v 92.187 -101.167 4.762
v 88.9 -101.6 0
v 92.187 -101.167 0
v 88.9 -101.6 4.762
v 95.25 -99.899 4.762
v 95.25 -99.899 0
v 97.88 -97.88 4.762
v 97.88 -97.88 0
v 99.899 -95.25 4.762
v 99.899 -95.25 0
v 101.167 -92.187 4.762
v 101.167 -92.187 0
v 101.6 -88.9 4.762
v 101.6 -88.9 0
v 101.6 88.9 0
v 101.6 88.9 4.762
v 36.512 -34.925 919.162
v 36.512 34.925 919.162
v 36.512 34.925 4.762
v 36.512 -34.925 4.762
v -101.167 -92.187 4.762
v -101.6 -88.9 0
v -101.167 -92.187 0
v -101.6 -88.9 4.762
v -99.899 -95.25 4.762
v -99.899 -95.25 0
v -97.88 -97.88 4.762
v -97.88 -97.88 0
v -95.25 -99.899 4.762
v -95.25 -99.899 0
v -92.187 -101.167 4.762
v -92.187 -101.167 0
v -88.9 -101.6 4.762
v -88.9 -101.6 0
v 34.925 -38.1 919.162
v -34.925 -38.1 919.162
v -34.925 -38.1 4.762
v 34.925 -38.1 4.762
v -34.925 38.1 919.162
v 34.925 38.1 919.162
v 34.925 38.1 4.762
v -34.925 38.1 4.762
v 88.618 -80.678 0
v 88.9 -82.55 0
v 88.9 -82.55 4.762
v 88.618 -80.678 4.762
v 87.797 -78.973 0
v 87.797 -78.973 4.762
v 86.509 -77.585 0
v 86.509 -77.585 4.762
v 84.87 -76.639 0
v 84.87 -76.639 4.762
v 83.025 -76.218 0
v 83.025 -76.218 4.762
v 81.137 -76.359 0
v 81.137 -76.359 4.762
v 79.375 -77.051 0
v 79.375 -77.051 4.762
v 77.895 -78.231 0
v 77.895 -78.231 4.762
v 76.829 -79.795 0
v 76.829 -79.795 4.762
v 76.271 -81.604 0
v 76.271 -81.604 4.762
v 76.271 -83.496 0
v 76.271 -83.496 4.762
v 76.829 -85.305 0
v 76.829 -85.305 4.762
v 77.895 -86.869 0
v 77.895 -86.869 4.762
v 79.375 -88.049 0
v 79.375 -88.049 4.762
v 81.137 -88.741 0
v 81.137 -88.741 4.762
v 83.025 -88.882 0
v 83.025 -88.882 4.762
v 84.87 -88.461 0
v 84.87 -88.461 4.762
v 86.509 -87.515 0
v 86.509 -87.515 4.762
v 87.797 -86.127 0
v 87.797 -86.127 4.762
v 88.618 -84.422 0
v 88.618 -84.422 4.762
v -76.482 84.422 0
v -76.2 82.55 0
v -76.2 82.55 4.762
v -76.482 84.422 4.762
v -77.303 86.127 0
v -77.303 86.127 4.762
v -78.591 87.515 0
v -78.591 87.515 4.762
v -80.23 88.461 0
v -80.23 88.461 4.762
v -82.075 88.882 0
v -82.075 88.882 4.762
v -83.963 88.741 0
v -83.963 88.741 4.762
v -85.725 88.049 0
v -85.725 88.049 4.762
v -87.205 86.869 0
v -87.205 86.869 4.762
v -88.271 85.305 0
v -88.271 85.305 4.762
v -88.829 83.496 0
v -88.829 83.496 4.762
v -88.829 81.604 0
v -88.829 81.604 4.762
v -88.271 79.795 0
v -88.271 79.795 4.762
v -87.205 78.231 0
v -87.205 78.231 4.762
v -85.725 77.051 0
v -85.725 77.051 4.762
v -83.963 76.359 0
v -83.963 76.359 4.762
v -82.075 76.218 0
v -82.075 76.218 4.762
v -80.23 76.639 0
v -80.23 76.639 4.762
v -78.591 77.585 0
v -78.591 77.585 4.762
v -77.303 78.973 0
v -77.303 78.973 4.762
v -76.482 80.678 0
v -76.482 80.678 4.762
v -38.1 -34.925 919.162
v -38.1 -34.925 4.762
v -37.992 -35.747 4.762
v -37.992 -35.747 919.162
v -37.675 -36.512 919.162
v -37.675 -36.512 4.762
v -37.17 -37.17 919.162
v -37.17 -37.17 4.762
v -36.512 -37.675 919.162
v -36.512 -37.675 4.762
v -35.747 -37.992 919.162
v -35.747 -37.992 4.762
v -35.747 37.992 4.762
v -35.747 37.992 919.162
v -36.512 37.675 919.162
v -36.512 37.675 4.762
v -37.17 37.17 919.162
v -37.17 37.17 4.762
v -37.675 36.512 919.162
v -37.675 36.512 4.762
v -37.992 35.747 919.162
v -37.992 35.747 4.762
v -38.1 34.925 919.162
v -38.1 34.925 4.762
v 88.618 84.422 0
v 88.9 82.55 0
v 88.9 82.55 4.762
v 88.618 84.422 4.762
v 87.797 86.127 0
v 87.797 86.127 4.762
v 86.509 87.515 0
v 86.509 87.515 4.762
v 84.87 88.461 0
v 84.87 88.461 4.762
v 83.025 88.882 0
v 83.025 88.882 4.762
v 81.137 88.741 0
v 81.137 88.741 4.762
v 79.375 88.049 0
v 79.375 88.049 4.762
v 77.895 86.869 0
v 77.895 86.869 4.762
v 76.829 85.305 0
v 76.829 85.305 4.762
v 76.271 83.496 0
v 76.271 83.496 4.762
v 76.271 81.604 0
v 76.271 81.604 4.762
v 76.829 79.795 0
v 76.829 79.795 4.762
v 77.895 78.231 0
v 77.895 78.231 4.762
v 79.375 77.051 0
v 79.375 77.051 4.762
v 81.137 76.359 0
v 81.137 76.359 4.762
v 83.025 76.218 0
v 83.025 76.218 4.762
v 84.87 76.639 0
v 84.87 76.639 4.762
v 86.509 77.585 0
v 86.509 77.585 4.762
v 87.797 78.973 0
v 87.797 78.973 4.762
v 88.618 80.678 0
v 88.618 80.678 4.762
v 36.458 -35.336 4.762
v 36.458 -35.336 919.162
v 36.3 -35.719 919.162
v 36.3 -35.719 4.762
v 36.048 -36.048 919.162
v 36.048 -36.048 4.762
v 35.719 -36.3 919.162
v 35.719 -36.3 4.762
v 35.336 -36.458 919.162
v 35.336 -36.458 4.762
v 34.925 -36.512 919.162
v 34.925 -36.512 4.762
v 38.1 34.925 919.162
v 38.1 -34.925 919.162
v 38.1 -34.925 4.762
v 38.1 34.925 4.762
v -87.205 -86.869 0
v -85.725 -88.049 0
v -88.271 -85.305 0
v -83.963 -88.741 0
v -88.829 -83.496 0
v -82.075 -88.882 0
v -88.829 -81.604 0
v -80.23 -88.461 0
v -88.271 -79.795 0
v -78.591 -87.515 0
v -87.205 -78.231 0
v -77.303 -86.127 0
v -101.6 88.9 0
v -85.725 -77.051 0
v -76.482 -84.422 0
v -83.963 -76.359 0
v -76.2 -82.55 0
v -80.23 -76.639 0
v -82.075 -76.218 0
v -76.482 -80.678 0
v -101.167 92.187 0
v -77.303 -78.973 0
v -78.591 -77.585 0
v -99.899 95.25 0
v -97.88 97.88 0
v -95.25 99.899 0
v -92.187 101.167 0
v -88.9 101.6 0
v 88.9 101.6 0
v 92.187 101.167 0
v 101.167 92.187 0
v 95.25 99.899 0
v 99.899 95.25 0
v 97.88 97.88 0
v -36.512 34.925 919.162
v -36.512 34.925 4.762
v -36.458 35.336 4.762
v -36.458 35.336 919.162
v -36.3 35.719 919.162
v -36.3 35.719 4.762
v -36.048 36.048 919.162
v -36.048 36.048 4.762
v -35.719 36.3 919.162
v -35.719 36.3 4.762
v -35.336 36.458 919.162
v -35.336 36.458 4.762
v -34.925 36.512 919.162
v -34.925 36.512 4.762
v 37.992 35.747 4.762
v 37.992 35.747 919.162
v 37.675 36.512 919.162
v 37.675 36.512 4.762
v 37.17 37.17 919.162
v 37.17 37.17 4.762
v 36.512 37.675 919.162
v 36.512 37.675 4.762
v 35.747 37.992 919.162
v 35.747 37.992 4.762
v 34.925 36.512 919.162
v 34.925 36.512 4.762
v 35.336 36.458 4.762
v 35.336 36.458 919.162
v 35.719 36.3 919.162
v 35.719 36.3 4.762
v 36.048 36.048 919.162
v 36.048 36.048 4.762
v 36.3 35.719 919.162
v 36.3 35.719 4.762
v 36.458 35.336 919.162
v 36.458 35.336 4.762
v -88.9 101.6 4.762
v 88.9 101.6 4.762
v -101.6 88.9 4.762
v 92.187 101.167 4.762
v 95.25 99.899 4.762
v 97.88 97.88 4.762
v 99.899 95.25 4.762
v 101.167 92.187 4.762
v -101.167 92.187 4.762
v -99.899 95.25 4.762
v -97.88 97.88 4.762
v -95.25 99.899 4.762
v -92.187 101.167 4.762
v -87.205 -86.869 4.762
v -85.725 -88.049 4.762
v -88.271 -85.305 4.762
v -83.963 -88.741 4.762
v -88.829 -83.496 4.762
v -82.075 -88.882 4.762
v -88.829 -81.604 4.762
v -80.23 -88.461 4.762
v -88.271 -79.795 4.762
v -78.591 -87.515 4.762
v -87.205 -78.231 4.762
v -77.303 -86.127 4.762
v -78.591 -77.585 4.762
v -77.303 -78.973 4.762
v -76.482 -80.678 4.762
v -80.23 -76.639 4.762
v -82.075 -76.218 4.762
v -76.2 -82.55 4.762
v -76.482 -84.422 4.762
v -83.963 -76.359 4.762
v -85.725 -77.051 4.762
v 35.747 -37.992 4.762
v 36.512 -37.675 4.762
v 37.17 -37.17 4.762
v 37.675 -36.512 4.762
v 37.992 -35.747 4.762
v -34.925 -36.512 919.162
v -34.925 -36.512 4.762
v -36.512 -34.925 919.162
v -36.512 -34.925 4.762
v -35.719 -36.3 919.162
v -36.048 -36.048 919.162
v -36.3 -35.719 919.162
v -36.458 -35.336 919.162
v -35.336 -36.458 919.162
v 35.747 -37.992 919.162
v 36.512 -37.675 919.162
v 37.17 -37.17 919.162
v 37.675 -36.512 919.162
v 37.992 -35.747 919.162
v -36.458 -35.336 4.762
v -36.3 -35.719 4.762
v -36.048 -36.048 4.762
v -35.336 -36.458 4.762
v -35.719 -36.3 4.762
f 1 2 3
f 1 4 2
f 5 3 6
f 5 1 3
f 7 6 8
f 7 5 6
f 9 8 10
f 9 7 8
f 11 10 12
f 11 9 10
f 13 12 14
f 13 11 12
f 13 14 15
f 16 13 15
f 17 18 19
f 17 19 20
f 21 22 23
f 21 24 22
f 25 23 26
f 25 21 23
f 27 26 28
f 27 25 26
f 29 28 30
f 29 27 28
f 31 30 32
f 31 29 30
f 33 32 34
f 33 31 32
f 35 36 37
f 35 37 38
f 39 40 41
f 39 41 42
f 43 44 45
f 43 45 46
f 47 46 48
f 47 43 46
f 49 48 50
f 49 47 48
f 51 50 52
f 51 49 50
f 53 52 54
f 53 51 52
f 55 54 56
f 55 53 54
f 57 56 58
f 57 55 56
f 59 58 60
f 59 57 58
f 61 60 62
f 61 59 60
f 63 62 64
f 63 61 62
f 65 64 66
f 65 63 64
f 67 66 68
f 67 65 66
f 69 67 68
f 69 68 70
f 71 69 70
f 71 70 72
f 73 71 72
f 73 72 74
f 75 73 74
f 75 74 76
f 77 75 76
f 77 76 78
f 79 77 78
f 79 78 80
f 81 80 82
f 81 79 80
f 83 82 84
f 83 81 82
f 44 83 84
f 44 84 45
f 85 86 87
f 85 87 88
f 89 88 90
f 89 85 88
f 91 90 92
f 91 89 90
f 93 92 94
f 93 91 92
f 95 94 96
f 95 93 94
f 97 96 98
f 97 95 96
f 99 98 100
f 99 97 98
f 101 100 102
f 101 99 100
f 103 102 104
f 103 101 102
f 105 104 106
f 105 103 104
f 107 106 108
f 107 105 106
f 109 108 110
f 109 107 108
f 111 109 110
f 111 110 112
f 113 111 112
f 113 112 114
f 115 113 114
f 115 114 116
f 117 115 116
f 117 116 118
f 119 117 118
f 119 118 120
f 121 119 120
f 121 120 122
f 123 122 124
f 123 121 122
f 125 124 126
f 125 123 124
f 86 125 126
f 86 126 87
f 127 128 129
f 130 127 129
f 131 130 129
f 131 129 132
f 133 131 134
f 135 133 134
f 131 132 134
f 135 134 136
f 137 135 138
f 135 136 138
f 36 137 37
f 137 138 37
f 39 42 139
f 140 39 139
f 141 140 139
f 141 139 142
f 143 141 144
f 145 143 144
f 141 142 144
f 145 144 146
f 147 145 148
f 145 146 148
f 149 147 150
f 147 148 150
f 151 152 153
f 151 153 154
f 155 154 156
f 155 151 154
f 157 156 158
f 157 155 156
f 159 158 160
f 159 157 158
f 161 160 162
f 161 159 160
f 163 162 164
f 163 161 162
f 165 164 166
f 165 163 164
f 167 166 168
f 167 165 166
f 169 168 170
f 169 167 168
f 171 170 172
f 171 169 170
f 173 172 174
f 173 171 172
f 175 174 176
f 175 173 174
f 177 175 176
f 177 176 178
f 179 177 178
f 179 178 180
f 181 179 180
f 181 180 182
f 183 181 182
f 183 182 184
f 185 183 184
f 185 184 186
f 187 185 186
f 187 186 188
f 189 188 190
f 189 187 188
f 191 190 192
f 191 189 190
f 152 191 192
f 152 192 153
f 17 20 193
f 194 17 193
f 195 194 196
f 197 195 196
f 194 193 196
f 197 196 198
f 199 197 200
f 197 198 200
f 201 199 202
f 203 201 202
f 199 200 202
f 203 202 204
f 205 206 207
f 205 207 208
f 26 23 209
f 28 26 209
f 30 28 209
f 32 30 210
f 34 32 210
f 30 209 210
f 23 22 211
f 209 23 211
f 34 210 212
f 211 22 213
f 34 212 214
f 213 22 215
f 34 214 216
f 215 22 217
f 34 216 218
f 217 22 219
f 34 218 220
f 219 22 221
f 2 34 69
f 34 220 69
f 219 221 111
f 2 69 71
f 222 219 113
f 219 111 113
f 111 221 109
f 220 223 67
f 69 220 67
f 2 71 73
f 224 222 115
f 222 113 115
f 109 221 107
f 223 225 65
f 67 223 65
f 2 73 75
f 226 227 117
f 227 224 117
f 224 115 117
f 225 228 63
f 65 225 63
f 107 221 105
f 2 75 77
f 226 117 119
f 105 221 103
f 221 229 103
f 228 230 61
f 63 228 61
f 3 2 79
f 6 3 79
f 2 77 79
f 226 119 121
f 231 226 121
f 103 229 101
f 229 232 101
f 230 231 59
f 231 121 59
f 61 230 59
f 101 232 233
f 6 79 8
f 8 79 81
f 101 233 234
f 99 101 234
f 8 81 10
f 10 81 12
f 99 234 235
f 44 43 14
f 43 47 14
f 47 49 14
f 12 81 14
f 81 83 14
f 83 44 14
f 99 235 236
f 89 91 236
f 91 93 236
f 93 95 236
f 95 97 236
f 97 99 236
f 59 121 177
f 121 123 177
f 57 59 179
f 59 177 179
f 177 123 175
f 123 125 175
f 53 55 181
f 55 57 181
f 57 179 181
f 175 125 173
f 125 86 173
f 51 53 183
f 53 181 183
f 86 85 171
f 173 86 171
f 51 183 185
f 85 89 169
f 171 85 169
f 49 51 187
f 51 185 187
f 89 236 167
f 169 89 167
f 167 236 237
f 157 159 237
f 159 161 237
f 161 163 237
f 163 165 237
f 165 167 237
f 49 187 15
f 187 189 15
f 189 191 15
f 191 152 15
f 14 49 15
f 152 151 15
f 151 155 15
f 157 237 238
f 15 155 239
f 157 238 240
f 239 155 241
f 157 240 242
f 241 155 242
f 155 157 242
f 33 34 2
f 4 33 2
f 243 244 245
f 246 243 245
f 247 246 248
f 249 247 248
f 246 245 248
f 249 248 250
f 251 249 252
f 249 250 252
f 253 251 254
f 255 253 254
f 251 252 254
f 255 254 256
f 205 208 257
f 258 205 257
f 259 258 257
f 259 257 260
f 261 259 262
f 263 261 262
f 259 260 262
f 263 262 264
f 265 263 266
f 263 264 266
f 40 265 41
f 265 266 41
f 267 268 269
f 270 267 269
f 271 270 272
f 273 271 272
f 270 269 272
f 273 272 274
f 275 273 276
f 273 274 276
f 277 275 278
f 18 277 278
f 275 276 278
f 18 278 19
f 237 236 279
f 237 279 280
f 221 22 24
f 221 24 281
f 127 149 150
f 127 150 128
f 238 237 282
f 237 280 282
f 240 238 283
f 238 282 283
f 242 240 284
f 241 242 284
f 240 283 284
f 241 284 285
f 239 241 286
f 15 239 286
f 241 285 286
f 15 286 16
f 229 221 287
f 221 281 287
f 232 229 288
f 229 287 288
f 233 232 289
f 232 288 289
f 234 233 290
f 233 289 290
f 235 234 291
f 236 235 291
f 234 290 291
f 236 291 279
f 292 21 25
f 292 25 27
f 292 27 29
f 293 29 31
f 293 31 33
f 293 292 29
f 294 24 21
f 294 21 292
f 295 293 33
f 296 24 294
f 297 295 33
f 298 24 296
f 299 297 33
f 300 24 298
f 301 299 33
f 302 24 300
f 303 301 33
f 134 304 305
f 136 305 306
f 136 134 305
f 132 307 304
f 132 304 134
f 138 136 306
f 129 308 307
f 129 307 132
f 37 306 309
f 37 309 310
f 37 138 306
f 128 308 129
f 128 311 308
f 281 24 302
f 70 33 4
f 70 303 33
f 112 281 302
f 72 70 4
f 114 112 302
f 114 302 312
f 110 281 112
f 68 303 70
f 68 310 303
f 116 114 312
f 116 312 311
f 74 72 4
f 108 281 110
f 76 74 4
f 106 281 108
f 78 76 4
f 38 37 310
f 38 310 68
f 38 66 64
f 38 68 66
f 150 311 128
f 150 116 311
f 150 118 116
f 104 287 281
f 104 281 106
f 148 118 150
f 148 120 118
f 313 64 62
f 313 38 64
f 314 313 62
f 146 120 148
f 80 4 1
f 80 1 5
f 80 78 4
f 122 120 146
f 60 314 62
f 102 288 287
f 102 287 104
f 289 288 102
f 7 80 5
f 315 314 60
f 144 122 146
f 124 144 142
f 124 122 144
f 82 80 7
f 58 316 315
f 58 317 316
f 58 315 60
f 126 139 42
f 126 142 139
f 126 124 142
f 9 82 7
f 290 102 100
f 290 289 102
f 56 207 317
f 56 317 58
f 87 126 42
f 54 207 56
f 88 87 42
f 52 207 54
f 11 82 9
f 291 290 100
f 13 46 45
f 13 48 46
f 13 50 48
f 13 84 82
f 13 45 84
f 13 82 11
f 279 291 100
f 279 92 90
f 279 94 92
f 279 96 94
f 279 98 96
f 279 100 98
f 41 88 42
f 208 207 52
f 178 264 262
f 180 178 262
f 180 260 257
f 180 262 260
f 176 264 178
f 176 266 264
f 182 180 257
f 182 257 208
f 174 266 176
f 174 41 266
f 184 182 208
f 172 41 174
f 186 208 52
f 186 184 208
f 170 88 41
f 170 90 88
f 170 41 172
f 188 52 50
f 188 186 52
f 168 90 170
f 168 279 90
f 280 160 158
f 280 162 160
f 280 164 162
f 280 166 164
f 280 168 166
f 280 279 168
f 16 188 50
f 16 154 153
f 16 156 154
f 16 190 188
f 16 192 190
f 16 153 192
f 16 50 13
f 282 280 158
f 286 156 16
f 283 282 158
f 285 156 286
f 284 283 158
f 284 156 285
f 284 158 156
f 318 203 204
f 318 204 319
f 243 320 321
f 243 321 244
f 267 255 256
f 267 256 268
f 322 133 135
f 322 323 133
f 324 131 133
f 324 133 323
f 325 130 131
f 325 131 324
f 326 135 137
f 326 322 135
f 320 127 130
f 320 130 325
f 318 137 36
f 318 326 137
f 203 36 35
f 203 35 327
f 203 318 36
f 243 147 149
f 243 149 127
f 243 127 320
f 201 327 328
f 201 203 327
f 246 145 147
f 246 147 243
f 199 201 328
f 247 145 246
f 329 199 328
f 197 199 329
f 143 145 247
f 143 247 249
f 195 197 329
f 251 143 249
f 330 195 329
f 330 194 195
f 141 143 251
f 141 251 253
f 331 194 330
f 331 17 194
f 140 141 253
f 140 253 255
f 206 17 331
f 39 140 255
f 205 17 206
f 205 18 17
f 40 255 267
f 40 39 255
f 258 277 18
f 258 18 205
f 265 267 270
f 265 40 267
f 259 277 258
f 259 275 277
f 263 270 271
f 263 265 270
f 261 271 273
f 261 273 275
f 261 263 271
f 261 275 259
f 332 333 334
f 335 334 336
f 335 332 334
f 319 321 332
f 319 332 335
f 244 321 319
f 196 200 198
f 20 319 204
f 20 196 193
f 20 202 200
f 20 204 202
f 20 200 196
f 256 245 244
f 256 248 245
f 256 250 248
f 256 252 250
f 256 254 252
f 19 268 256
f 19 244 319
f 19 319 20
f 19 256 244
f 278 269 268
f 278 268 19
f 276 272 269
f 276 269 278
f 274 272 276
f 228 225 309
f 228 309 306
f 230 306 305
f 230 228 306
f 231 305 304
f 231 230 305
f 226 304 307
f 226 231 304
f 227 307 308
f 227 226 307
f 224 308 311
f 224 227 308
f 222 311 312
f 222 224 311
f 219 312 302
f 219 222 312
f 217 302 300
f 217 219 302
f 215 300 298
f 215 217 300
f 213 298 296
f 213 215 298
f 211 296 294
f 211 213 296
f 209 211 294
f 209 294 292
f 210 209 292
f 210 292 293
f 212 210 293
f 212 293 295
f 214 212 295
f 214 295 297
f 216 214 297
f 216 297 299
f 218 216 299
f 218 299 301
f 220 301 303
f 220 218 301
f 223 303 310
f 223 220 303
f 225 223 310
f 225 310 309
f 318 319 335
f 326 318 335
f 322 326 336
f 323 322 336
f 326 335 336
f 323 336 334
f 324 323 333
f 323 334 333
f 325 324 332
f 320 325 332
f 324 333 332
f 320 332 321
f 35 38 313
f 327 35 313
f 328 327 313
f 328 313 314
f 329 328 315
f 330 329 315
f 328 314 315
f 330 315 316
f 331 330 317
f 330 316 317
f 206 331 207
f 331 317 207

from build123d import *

# Parameters (mm, degrees)
F0_W     = 203.2
F0_H     = 203.2
F0_R     = 6.35
F1_DEPTH = 4.7625
F2_R     = 12.7
F4_DEPTH = 914.4


with BuildPart() as f1:
    # F0 (on Top) → F1 (new body)
    with BuildSketch(Plane.XY):
        Rectangle(F0_W, F0_H)
        with Locations((-82.55, -82.55)):
            Circle(F0_R, mode=Mode.SUBTRACT)
        with Locations((82.55, -82.55)):
            Circle(F0_R, mode=Mode.SUBTRACT)
        with Locations((-82.55, 82.55)):
            Circle(F0_R, mode=Mode.SUBTRACT)
        with Locations((82.55, 82.55)):
            Circle(F0_R, mode=Mode.SUBTRACT)
    extrude(amount=F1_DEPTH)

    # F2
    f2_edges = [f1.edges().sort_by_distance(p)[0] for p in [
        (-101.6, -101.6, 2.38125),
        (101.6, -101.6, 2.38125),
        (101.6, 101.6, 2.38125),
        (-101.6, 101.6, 2.38125),
    ]]
    fillet(f2_edges, radius=F2_R)

    # F3 (on face) → F4 (join)
    with BuildSketch(Plane.XY.offset(4.7625)):
        with BuildLine():
            Line((34.925, 38.1), (-34.925, 38.1))
            ThreePointArc((-34.925, 38.1), (-37.170064, 37.170064), (-38.1, 34.925))
            Line((-38.1, 34.925), (-38.1, -34.925))
            ThreePointArc((-38.1, -34.925), (-37.170064, -37.170064), (-34.925, -38.1))
            Line((-34.925, -38.1), (34.925, -38.1))
            ThreePointArc((34.925, -38.1), (37.170064, -37.170064), (38.1, -34.925))
            Line((38.1, -34.925), (38.1, 34.925))
            ThreePointArc((38.1, 34.925), (37.170064, 37.170064), (34.925, 38.1))
        make_face()
        with BuildLine():
            Line((-36.5125, -34.925), (-36.5125, 34.925))
            ThreePointArc((-36.5125, 34.925), (-36.047532, 36.047532), (-34.925, 36.5125))
            Line((-34.925, 36.5125), (34.925, 36.5125))
            ThreePointArc((34.925, 36.5125), (36.047532, 36.047532), (36.5125, 34.925))
            Line((36.5125, 34.925), (36.5125, -34.925))
            ThreePointArc((36.5125, -34.925), (36.047532, -36.047532), (34.925, -36.5125))
            Line((34.925, -36.5125), (-34.925, -36.5125))
            ThreePointArc((-34.925, -36.5125), (-36.047532, -36.047532), (-36.5125, -34.925))
        make_face(mode=Mode.SUBTRACT)
    extrude(amount=F4_DEPTH)


solid = f1.part
